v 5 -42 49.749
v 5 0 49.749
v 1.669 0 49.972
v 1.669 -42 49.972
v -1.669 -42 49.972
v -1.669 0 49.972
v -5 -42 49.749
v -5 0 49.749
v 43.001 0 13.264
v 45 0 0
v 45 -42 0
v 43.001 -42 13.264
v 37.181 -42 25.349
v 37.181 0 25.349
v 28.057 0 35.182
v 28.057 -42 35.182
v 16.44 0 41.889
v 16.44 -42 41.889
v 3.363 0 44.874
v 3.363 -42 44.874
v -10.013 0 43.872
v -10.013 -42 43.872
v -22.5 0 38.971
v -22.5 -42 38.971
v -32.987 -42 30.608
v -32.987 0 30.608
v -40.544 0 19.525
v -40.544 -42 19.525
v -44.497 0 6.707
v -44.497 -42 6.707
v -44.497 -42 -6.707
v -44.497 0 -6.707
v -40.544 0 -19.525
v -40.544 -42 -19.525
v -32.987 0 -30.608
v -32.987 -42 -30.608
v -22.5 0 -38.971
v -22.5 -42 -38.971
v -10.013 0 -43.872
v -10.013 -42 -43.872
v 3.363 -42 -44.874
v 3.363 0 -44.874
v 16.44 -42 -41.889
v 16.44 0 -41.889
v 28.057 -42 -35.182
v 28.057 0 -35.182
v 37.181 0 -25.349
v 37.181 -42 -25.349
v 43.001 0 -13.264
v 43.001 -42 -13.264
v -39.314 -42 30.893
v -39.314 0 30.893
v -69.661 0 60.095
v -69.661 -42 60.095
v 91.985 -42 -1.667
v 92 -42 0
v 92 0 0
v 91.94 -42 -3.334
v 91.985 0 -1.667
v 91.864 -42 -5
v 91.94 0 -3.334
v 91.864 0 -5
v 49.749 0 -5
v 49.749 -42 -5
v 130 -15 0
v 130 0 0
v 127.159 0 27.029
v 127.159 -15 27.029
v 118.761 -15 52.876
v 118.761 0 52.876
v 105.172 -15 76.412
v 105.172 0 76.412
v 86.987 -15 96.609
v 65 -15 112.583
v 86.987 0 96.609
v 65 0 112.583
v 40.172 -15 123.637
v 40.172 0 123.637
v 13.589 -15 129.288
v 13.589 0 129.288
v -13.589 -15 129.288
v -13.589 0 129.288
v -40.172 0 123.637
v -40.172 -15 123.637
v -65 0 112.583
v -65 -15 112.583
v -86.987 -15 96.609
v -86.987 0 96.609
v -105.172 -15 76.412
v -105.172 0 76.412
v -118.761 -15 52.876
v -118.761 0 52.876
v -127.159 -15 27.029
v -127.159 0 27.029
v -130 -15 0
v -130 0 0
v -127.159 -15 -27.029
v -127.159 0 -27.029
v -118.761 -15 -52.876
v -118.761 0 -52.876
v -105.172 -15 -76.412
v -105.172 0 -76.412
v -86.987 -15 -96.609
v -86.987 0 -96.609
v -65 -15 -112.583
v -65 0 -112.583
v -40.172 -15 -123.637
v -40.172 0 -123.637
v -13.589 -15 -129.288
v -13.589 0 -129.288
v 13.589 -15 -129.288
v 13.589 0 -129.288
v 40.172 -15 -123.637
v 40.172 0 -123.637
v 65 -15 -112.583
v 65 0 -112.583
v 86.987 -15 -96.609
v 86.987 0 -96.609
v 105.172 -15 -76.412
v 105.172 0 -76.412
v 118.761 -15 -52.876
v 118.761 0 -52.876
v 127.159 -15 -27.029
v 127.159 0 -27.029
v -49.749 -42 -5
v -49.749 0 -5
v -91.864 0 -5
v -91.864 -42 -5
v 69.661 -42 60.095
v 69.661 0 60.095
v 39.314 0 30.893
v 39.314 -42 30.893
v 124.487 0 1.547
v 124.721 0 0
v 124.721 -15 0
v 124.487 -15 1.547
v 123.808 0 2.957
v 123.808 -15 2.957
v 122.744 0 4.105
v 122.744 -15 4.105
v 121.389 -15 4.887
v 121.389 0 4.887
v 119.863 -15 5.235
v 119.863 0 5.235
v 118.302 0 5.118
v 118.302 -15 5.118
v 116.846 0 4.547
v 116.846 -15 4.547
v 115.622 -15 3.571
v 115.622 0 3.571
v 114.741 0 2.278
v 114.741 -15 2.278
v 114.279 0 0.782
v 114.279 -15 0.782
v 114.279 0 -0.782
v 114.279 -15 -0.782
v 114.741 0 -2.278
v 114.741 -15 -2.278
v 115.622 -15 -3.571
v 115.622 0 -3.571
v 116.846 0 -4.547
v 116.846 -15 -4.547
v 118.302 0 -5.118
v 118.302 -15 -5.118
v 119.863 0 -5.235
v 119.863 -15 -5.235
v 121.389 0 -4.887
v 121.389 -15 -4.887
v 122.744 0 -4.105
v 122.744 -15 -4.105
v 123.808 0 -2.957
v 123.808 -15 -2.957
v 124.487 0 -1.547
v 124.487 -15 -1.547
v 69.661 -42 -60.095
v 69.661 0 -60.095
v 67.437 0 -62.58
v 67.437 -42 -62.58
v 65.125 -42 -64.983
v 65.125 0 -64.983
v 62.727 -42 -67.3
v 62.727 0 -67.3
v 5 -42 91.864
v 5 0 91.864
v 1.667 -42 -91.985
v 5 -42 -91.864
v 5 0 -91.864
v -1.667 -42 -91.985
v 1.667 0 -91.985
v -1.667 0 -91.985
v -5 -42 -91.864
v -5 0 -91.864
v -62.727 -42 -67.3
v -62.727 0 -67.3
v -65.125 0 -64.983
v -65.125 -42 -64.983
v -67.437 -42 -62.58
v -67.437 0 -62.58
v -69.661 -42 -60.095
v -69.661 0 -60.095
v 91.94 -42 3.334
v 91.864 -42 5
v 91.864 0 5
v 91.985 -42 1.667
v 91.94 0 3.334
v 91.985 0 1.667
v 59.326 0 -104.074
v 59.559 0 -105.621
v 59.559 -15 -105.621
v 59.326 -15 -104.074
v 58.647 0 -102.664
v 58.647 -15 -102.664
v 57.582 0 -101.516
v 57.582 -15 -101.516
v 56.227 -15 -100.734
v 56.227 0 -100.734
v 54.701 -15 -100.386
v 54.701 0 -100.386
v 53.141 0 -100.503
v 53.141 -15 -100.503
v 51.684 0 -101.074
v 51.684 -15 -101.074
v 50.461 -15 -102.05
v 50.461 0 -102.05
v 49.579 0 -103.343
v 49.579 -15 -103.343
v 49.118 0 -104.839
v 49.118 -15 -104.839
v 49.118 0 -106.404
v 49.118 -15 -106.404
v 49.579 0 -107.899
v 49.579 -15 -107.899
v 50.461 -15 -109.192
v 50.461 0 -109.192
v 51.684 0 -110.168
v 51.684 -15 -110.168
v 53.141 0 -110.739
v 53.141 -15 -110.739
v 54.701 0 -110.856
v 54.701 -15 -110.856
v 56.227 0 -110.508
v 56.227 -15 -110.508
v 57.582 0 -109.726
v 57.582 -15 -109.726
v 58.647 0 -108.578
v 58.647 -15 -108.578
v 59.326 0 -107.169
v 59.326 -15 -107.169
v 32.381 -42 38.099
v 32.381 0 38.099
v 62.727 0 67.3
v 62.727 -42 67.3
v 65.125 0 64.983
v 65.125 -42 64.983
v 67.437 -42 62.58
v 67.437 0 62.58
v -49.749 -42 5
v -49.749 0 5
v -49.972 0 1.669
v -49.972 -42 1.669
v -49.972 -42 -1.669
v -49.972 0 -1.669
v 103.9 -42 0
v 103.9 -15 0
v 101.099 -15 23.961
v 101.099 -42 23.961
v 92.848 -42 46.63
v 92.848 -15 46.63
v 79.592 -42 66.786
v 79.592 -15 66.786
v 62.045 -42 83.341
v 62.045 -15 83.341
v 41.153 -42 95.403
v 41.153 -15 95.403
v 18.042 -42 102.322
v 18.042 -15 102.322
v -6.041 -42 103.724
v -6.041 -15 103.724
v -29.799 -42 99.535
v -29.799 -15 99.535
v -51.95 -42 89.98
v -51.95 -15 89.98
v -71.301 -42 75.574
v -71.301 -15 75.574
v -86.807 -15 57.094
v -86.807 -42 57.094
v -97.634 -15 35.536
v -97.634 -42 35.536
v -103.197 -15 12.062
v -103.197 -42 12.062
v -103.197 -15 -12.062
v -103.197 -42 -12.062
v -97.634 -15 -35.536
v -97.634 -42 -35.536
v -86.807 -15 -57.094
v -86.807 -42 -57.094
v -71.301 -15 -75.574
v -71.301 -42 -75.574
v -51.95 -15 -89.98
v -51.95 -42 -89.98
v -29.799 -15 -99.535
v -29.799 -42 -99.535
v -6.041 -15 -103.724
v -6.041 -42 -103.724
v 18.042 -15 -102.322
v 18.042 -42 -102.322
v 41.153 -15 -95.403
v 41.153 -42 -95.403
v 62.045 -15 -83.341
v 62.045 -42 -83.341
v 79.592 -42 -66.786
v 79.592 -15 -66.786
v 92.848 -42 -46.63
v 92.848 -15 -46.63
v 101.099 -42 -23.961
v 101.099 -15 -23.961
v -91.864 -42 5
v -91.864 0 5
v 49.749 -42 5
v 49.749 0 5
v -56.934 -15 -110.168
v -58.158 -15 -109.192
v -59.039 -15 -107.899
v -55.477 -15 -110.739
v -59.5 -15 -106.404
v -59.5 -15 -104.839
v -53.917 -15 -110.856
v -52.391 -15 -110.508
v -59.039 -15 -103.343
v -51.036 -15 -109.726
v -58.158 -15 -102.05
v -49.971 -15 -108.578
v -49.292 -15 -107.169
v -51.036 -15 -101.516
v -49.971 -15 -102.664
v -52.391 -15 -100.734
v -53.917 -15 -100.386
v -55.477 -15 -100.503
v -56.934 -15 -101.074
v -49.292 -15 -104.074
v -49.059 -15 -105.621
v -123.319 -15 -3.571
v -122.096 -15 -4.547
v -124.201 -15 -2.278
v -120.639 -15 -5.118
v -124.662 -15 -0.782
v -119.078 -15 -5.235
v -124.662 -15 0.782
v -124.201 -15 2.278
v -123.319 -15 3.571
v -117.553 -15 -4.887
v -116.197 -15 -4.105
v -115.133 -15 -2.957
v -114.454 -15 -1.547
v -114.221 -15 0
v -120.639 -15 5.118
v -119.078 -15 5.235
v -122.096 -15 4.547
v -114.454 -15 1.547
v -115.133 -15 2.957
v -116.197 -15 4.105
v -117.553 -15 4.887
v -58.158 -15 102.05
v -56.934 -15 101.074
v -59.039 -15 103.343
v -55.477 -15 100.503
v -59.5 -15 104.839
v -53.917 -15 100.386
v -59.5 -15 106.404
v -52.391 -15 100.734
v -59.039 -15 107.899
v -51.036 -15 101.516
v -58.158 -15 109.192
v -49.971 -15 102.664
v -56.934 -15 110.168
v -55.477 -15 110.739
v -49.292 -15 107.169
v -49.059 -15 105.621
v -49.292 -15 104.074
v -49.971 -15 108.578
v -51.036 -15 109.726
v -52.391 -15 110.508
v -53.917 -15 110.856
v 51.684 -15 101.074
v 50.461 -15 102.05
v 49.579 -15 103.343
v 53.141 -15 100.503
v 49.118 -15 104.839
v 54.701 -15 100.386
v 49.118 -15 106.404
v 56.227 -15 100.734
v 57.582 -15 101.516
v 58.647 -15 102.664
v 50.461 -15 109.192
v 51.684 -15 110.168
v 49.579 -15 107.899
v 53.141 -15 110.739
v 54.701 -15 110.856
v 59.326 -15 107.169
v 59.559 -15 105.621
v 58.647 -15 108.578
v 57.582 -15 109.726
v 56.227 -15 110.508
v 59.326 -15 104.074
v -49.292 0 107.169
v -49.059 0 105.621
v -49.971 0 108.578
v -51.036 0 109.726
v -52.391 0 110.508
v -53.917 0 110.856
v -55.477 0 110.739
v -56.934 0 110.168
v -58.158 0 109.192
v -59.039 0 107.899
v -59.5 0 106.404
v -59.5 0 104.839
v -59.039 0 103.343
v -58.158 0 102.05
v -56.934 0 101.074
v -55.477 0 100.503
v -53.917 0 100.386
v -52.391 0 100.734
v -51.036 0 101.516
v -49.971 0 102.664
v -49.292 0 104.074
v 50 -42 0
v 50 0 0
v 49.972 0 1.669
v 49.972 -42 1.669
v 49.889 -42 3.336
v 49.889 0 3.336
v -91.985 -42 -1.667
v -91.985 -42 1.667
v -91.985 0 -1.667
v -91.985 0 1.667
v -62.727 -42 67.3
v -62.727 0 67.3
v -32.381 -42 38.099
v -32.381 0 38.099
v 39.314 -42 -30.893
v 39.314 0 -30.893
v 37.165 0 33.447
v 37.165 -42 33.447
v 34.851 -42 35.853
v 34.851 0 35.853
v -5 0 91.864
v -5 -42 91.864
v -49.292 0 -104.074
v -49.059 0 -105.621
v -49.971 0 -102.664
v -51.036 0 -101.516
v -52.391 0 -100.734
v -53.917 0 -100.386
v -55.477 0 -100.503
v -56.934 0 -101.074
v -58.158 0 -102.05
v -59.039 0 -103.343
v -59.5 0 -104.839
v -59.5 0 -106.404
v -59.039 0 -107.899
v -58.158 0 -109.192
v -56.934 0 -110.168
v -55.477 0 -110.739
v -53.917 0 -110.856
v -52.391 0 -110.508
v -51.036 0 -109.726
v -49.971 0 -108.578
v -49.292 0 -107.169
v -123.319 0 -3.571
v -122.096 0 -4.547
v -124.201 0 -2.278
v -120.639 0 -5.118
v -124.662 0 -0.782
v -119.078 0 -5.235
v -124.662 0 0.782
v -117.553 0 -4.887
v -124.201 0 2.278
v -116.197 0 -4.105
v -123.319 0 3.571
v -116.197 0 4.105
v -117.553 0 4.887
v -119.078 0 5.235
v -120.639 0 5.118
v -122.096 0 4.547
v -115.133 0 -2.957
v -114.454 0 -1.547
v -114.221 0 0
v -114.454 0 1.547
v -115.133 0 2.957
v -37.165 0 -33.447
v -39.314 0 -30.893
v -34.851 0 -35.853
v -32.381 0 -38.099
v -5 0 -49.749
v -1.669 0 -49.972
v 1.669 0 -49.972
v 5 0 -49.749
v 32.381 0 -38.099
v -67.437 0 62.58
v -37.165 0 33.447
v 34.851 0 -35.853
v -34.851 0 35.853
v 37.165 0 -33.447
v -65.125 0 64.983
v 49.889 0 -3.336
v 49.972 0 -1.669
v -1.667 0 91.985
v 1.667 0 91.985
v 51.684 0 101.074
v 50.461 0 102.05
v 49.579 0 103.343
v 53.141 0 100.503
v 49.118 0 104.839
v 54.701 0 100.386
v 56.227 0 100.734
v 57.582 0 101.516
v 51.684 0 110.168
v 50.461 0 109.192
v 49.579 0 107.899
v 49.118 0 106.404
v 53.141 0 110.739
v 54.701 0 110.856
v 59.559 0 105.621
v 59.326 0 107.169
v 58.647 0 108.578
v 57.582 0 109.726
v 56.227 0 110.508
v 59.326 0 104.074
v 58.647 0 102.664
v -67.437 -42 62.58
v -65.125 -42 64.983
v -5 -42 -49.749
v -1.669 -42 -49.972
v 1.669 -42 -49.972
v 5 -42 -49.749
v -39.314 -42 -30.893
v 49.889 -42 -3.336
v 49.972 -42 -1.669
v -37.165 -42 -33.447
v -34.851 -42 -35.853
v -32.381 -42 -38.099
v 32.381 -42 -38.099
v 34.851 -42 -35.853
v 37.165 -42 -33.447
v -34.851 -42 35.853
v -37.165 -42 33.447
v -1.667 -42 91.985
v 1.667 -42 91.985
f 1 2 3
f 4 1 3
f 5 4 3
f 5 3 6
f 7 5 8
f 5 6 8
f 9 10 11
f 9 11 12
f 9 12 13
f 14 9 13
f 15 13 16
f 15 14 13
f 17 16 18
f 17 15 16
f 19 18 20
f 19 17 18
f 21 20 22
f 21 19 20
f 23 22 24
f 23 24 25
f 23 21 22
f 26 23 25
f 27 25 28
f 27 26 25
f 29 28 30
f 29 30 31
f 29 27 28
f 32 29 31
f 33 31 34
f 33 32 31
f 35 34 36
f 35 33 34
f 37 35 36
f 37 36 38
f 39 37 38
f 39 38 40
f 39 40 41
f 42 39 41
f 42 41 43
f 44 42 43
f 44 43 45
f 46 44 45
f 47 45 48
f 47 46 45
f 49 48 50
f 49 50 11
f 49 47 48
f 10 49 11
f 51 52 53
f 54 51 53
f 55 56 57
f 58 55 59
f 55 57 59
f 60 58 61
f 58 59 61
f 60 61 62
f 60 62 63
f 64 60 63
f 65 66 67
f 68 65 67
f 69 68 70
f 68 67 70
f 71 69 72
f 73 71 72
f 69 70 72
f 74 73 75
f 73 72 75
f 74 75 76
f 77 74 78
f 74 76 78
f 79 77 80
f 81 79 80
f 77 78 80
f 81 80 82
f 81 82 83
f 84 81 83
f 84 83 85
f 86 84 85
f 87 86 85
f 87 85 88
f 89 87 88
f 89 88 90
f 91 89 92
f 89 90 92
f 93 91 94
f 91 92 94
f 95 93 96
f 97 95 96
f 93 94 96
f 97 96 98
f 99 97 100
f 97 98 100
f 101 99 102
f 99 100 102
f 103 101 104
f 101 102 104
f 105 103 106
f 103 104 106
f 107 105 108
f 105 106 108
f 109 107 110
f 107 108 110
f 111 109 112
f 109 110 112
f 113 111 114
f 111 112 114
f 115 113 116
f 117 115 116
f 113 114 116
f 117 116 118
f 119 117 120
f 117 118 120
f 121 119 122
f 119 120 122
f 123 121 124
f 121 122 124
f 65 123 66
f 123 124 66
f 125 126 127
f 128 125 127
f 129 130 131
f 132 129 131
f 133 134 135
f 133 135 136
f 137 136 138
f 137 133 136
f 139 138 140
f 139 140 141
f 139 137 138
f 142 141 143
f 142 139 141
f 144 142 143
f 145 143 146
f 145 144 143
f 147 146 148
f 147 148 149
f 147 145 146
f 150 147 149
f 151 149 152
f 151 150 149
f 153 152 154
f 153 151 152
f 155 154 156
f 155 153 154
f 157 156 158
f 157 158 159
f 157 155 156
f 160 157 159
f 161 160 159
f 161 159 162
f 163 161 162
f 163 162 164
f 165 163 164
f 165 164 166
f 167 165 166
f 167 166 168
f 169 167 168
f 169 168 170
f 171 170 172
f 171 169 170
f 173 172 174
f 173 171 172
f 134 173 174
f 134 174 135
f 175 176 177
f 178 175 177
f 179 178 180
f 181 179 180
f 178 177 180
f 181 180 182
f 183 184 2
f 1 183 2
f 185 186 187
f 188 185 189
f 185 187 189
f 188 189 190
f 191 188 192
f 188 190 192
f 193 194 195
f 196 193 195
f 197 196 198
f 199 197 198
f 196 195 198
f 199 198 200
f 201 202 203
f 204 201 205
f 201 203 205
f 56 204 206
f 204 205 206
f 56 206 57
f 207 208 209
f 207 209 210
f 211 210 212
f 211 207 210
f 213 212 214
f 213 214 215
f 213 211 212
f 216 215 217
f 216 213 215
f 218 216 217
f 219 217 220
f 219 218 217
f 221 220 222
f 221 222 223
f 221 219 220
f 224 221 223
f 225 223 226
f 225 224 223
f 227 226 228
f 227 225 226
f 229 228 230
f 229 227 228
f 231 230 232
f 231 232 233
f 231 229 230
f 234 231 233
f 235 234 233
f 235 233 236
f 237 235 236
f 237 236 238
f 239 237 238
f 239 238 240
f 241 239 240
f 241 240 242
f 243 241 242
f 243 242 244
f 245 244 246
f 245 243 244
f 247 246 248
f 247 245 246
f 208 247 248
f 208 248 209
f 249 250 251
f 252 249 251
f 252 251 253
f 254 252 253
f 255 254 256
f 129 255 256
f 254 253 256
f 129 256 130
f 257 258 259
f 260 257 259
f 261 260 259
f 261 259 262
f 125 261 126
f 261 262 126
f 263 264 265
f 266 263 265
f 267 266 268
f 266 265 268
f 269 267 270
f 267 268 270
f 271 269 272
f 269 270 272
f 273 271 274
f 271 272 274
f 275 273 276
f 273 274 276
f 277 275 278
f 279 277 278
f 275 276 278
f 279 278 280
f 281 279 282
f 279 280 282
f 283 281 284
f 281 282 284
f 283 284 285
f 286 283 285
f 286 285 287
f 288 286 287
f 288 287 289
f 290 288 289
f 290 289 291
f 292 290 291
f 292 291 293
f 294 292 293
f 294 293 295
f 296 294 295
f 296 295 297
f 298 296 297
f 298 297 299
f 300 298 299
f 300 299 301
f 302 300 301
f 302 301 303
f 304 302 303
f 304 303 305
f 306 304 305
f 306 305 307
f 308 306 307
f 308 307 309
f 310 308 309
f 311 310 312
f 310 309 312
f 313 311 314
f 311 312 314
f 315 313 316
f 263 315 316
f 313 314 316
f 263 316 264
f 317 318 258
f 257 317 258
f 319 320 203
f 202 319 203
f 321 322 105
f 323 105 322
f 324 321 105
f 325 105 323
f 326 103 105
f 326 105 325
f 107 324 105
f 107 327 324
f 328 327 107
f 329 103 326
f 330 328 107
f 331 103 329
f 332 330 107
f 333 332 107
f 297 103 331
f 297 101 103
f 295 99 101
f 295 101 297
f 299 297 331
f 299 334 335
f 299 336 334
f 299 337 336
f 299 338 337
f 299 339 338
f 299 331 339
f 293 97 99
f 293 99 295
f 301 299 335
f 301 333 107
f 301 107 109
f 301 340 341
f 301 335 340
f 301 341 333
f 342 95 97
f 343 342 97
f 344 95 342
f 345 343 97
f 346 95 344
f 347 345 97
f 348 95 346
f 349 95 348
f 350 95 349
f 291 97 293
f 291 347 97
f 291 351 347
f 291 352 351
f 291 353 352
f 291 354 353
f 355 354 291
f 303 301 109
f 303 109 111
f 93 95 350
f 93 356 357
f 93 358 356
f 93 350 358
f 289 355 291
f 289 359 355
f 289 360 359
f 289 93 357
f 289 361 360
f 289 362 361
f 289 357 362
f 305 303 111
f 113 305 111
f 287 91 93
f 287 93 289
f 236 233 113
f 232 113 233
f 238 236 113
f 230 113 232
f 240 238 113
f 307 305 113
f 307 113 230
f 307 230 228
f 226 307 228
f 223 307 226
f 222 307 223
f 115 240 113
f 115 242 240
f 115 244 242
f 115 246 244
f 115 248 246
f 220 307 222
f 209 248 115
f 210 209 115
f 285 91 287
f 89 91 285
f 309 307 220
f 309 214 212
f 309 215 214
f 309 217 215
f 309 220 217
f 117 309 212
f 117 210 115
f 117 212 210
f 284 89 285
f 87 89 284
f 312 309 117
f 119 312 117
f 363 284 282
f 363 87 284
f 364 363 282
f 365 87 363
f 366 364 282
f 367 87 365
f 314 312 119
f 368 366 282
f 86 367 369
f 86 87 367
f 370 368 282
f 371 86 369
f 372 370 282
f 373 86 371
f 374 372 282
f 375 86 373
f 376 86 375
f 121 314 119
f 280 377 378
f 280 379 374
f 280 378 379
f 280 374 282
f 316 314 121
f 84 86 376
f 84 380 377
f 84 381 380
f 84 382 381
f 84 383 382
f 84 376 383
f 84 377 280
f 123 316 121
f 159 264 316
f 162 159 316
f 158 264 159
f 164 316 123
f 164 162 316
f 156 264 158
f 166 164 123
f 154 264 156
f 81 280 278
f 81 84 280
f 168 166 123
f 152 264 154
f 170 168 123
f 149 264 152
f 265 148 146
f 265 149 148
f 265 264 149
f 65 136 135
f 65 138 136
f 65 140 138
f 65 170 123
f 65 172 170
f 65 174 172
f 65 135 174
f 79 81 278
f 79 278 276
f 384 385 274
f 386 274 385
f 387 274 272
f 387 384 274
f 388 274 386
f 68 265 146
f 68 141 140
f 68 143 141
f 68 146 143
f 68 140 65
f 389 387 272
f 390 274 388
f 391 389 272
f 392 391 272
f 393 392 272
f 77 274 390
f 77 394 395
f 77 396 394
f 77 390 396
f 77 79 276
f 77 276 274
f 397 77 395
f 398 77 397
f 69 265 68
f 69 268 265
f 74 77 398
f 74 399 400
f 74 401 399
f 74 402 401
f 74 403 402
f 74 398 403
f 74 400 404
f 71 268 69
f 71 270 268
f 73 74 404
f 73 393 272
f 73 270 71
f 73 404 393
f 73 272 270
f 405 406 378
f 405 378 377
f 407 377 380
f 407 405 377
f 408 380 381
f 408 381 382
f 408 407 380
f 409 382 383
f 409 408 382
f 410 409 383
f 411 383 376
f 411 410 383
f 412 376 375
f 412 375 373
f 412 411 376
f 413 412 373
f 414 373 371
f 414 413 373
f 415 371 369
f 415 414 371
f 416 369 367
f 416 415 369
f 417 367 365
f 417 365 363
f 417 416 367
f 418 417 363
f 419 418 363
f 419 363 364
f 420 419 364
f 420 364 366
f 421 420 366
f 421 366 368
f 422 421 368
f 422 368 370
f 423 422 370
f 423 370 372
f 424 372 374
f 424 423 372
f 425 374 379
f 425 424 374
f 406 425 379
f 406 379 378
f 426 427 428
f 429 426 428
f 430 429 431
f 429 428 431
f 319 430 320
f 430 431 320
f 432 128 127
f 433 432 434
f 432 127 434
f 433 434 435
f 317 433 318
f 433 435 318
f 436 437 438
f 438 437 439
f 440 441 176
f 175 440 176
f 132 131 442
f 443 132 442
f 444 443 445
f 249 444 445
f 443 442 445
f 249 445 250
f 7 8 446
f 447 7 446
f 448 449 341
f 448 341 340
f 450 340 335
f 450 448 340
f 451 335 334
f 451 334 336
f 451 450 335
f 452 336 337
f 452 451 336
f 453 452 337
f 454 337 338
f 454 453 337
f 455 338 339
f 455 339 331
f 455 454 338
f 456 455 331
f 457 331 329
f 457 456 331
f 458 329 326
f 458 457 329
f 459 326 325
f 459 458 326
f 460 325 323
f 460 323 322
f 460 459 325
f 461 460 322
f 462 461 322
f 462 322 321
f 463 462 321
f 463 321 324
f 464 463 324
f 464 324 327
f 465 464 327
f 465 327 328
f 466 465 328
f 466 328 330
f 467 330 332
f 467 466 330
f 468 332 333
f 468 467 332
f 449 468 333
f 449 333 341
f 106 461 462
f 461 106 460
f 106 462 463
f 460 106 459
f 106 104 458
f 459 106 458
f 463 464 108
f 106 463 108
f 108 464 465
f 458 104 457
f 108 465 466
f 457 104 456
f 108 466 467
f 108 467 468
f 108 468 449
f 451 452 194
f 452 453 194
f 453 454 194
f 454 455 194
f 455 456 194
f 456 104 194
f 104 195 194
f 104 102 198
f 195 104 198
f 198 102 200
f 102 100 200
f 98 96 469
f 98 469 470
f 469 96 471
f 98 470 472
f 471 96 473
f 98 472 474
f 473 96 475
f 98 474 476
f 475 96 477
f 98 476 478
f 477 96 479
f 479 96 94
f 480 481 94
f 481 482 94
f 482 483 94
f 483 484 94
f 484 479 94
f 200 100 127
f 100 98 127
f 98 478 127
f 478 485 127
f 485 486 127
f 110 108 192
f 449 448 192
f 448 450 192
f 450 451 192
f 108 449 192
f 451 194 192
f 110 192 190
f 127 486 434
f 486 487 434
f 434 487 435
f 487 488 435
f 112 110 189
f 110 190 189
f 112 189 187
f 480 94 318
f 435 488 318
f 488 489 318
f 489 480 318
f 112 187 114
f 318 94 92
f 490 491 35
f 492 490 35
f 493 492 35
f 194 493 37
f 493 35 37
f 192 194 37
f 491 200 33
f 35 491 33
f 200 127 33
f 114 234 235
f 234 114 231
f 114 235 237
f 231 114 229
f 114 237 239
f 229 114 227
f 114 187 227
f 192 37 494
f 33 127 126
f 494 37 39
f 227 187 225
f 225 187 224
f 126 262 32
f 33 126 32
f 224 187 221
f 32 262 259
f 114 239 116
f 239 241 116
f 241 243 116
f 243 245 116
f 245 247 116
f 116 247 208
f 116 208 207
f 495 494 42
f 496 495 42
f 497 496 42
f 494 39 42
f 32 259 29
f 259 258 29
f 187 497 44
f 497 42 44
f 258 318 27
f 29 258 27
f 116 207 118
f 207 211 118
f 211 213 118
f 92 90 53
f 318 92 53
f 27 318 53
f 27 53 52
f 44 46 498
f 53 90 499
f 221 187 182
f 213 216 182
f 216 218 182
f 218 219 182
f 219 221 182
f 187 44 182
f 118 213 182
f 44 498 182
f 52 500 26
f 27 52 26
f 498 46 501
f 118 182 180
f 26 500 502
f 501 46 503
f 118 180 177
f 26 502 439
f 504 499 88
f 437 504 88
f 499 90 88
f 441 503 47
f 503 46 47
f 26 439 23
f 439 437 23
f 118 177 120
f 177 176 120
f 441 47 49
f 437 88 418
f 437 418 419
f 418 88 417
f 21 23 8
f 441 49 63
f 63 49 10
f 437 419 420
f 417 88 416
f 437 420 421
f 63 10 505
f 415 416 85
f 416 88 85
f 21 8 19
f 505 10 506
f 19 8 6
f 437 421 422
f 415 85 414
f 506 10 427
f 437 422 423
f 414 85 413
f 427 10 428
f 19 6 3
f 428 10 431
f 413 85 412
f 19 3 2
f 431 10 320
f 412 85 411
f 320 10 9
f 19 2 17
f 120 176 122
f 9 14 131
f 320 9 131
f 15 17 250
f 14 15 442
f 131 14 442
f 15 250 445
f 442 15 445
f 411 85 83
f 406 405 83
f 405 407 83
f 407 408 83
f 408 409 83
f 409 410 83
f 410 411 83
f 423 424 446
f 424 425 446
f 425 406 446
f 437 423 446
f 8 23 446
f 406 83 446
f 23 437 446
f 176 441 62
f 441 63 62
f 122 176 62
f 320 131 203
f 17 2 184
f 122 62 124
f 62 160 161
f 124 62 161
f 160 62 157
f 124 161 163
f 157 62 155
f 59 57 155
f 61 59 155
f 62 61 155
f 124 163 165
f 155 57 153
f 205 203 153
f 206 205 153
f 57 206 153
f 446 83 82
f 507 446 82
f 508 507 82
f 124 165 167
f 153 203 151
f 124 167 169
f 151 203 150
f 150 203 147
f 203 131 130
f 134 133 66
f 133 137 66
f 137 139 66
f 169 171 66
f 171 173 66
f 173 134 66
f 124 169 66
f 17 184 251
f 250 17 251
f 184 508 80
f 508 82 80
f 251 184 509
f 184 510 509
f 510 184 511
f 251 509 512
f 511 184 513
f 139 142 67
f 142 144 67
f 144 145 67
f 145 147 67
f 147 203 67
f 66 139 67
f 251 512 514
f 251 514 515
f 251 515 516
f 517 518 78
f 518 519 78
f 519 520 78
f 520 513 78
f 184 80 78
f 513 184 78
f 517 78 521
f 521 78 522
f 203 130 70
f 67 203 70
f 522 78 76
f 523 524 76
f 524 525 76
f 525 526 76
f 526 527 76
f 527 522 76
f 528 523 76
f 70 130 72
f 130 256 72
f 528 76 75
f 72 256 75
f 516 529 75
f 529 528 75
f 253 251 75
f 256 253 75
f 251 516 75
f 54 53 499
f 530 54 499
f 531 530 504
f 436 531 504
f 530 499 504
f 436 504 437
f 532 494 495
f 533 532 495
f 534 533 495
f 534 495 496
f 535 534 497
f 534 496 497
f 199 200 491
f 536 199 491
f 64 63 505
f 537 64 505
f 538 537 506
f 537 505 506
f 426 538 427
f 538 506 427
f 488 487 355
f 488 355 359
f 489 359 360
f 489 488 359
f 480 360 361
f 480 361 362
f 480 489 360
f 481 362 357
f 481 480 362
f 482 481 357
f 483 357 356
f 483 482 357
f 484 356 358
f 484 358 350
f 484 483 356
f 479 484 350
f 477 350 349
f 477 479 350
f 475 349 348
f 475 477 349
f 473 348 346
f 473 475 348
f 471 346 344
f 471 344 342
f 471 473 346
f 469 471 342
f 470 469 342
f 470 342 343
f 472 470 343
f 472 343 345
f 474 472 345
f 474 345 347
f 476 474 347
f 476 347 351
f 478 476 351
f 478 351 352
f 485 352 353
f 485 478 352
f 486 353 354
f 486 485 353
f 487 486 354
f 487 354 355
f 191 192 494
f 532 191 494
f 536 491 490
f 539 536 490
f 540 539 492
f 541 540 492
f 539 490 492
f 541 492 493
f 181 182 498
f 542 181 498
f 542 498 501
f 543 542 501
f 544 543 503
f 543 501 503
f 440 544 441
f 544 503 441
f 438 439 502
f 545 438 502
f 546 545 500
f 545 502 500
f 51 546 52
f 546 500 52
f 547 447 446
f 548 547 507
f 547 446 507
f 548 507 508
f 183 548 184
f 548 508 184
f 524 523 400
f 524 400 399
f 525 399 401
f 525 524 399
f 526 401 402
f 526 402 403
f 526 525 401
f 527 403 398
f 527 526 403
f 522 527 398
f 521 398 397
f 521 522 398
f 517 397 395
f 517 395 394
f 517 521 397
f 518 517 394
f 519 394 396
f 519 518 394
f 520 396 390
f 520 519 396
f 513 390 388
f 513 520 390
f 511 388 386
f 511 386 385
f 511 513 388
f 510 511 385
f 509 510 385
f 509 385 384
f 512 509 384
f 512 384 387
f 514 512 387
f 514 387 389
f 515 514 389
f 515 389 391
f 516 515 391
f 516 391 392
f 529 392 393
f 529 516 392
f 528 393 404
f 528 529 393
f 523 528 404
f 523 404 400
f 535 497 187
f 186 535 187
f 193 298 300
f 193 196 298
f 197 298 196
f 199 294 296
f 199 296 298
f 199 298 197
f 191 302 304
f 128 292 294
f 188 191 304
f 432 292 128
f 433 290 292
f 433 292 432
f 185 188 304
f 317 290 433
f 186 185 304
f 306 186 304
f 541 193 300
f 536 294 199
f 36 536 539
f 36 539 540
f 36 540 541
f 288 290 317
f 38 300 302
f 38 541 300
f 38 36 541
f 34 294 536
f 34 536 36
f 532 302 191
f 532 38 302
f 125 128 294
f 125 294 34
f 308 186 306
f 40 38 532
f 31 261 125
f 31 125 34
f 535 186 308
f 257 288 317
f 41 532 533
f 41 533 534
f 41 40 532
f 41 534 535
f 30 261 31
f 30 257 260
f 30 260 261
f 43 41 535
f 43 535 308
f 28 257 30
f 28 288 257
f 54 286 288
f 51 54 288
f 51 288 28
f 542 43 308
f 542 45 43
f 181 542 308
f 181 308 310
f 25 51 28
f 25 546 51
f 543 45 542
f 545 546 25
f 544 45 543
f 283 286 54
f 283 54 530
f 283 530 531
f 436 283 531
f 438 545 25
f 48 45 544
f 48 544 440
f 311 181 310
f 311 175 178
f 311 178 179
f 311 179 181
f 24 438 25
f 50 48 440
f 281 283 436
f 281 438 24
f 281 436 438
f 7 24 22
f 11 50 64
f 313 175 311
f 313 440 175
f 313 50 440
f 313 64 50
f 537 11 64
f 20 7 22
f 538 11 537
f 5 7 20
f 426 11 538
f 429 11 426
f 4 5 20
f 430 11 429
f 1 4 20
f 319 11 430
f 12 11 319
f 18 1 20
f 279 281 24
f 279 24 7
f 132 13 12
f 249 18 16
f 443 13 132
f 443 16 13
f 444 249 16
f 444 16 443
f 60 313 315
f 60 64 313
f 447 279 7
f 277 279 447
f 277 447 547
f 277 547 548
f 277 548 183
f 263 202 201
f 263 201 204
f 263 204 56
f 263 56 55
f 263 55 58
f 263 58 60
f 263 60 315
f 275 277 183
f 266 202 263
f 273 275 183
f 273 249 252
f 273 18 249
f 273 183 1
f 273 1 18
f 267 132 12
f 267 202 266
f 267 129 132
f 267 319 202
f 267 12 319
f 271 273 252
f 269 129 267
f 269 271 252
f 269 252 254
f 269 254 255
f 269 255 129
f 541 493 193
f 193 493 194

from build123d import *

# Parameters (mm, degrees)
F0_R     = 130
F0_R_2   = 5.25
F0_R_3   = 103.9
F1_DEPTH = 15
F0_R_4   = 95
F0_R_5   = 45
F2_DEPTH = 42


with BuildPart() as f1:
    # F0 (on Front) → F1 (new body)
    with BuildSketch(Plane.XZ):
        Circle(F0_R)
        with Locations((-54.3090440333, -105.6210622191)):
            Circle(F0_R_2, mode=Mode.SUBTRACT)
        with Locations((54.3090440333, -105.6210622191)):
            Circle(F0_R_2, mode=Mode.SUBTRACT)
        with Locations((-119.4707155228, 0)):
            Circle(F0_R_2, mode=Mode.SUBTRACT)
        with Locations((-54.3090440333, 105.6210622191)):
            Circle(F0_R_2, mode=Mode.SUBTRACT)
        Circle(F0_R_3, mode=Mode.SUBTRACT)
        with Locations((119.4707155228, 0)):
            Circle(F0_R_2, mode=Mode.SUBTRACT)
        with Locations((54.3090440333, 105.6210622191)):
            Circle(F0_R_2, mode=Mode.SUBTRACT)
    extrude(amount=F1_DEPTH)

    # F0 (on Front) → F2 (join)
    with BuildSketch(Plane.XZ):
        Circle(F0_R_3)
        Circle(F0_R_4, mode=Mode.SUBTRACT)
        Circle(F0_R_4)
        with BuildLine():
            ThreePointArc((69.6607525504, 60.094754797), (85.33124775, 34.3886341314), (91.8640299573, 5))
            ThreePointArc((91.8640299573, 5), (91.9660012072, 2.5009242218), (92, 0))
            ThreePointArc((92, 0), (91.9660012072, -2.5009242218), (91.8640299573, -5))
            ThreePointArc((91.8640299573, -5), (85.33124775, -34.3886341314), (69.6607525504, -60.094754797))
            ThreePointArc((69.6607525504, -60.094754797), (66.2917791865, -63.7918491054), (62.7268559085, -67.3003829694))
            ThreePointArc((62.7268559085, -67.3003829694), (36.0218675411, -84.6547403212), (5, -91.8640299573))
            ThreePointArc((5, -91.8640299573), (0, -92), (-5, -91.8640299573))
            ThreePointArc((-5, -91.8640299573), (-36.0218675411, -84.6547403212), (-62.7268559085, -67.3003829694))
            ThreePointArc((-62.7268559085, -67.3003829694), (-66.2917791865, -63.7918491054), (-69.6607525504, -60.094754797))
            ThreePointArc((-69.6607525504, -60.094754797), (-85.33124775, -34.3886341314), (-91.8640299573, -5))
            ThreePointArc((-91.8640299573, -5), (-92, 0), (-91.8640299573, 5))
            ThreePointArc((-91.8640299573, 5), (-85.33124775, 34.3886341314), (-69.6607525504, 60.094754797))
            ThreePointArc((-69.6607525504, 60.094754797), (-66.2917791865, 63.7918491054), (-62.7268559085, 67.3003829694))
            ThreePointArc((-62.7268559085, 67.3003829694), (-36.0218675411, 84.6547403212), (-5, 91.8640299573))
            ThreePointArc((-5, 91.8640299573), (0, 92), (5, 91.8640299573))
            ThreePointArc((5, 91.8640299573), (36.0218675411, 84.6547403212), (62.7268559085, 67.3003829694))
            ThreePointArc((62.7268559085, 67.3003829694), (66.2917791865, 63.7918491054), (69.6607525504, 60.094754797))
        make_face(mode=Mode.SUBTRACT)
        with BuildLine():
            ThreePointArc((49.7493718553, -5), (49.9373036555, -2.503138753), (50, 0))
            ThreePointArc((50, 0), (49.9373036555, 2.503138753), (49.7493718553, 5))
            ThreePointArc((49.7493718553, 5), (46.375678125, 18.6894750714), (39.3144958612, 30.8928861582))
            ThreePointArc((39.3144958612, 30.8928861582), (36.0281408622, 34.6694832095), (32.3805992193, 38.0985143306))
            ThreePointArc((32.3805992193, 38.0985143306), (19.5771019245, 46.0080110441), (5, 49.7493718553))
            ThreePointArc((5, 49.7493718553), (0, 50), (-5, 49.7493718553))
            ThreePointArc((-5, 49.7493718553), (-19.5771019245, 46.0080110441), (-32.3805992193, 38.0985143306))
            ThreePointArc((-32.3805992193, 38.0985143306), (-36.0281408622, 34.6694832095), (-39.3144958612, 30.8928861582))
            ThreePointArc((-39.3144958612, 30.8928861582), (-46.375678125, 18.6894750714), (-49.7493718553, 5))
            ThreePointArc((-49.7493718553, 5), (-50, 0), (-49.7493718553, -5))
            ThreePointArc((-49.7493718553, -5), (-46.375678125, -18.6894750714), (-39.3144958612, -30.8928861582))
            ThreePointArc((-39.3144958612, -30.8928861582), (-36.0281408622, -34.6694832095), (-32.3805992193, -38.0985143306))
            ThreePointArc((-32.3805992193, -38.0985143306), (-19.5771019245, -46.0080110441), (-5, -49.7493718553))
            ThreePointArc((-5, -49.7493718553), (0, -50), (5, -49.7493718553))
            ThreePointArc((5, -49.7493718553), (19.5771019245, -46.0080110441), (32.3805992193, -38.0985143306))
            ThreePointArc((32.3805992193, -38.0985143306), (36.0281408622, -34.6694832095), (39.3144958612, -30.8928861582))
            ThreePointArc((39.3144958612, -30.8928861582), (46.375678125, -18.6894750714), (49.7493718553, -5))
        make_face()
        Circle(F0_R_5, mode=Mode.SUBTRACT)
        with BuildLine():
            ThreePointArc((5, 49.7493718553), (19.5771019245, 46.0080110441), (32.3805992193, 38.0985143306))
            Line((32.3805992193, 38.0985143306), (62.7268559085, 67.3003829694))
            ThreePointArc((62.7268559085, 67.3003829694), (36.0218675411, 84.6547403212), (5, 91.8640299573))
            Line((5, 91.8640299573), (5, 49.7493718553))
        make_face()
        with BuildLine():
            ThreePointArc((-32.3805992193, 38.0985143306), (-19.5771019245, 46.0080110441), (-5, 49.7493718553))
            Line((-5, 49.7493718553), (-5, 91.8640299573))
            ThreePointArc((-5, 91.8640299573), (-36.0218675411, 84.6547403212), (-62.7268559085, 67.3003829694))
            Line((-62.7268559085, 67.3003829694), (-32.3805992193, 38.0985143306))
        make_face()
        with BuildLine():
            Line((-5, -91.8640299573), (-5, -49.7493718553))
            ThreePointArc((-5, -49.7493718553), (-19.5771019245, -46.0080110441), (-32.3805992193, -38.0985143306))
            Line((-32.3805992193, -38.0985143306), (-62.7268559085, -67.3003829694))
            ThreePointArc((-62.7268559085, -67.3003829694), (-36.0218675411, -84.6547403212), (-5, -91.8640299573))
        make_face()
        with BuildLine():
            Line((62.7268559085, -67.3003829694), (32.3805992193, -38.0985143306))
            ThreePointArc((32.3805992193, -38.0985143306), (19.5771019245, -46.0080110441), (5, -49.7493718553))
            Line((5, -49.7493718553), (5, -91.8640299573))
            ThreePointArc((5, -91.8640299573), (36.0218675411, -84.6547403212), (62.7268559085, -67.3003829694))
        make_face()
        with BuildLine():
            ThreePointArc((39.3144958612, 30.8928861582), (46.375678125, 18.6894750714), (49.7493718553, 5))
            Line((49.7493718553, 5), (91.8640299573, 5))
            ThreePointArc((91.8640299573, 5), (85.33124775, 34.3886341314), (69.6607525504, 60.094754797))
            Line((69.6607525504, 60.094754797), (39.3144958612, 30.8928861582))
        make_face()
        with BuildLine():
            ThreePointArc((-49.7493718553, 5), (-46.375678125, 18.6894750714), (-39.3144958612, 30.8928861582))
            Line((-39.3144958612, 30.8928861582), (-69.6607525504, 60.094754797))
            ThreePointArc((-69.6607525504, 60.094754797), (-85.33124775, 34.3886341314), (-91.8640299573, 5))
            Line((-91.8640299573, 5), (-49.7493718553, 5))
        make_face()
        with BuildLine():
            Line((-69.6607525504, -60.094754797), (-39.3144958612, -30.8928861582))
            ThreePointArc((-39.3144958612, -30.8928861582), (-46.375678125, -18.6894750714), (-49.7493718553, -5))
            Line((-49.7493718553, -5), (-91.8640299573, -5))
            ThreePointArc((-91.8640299573, -5), (-85.33124775, -34.3886341314), (-69.6607525504, -60.094754797))
        make_face()
        with BuildLine():
            Line((91.8640299573, -5), (49.7493718553, -5))
            ThreePointArc((49.7493718553, -5), (46.375678125, -18.6894750714), (39.3144958612, -30.8928861582))
            Line((39.3144958612, -30.8928861582), (69.6607525504, -60.094754797))
            ThreePointArc((69.6607525504, -60.094754797), (85.33124775, -34.3886341314), (91.8640299573, -5))
        make_face()
    extrude(amount=F2_DEPTH)


solid = f1.part
